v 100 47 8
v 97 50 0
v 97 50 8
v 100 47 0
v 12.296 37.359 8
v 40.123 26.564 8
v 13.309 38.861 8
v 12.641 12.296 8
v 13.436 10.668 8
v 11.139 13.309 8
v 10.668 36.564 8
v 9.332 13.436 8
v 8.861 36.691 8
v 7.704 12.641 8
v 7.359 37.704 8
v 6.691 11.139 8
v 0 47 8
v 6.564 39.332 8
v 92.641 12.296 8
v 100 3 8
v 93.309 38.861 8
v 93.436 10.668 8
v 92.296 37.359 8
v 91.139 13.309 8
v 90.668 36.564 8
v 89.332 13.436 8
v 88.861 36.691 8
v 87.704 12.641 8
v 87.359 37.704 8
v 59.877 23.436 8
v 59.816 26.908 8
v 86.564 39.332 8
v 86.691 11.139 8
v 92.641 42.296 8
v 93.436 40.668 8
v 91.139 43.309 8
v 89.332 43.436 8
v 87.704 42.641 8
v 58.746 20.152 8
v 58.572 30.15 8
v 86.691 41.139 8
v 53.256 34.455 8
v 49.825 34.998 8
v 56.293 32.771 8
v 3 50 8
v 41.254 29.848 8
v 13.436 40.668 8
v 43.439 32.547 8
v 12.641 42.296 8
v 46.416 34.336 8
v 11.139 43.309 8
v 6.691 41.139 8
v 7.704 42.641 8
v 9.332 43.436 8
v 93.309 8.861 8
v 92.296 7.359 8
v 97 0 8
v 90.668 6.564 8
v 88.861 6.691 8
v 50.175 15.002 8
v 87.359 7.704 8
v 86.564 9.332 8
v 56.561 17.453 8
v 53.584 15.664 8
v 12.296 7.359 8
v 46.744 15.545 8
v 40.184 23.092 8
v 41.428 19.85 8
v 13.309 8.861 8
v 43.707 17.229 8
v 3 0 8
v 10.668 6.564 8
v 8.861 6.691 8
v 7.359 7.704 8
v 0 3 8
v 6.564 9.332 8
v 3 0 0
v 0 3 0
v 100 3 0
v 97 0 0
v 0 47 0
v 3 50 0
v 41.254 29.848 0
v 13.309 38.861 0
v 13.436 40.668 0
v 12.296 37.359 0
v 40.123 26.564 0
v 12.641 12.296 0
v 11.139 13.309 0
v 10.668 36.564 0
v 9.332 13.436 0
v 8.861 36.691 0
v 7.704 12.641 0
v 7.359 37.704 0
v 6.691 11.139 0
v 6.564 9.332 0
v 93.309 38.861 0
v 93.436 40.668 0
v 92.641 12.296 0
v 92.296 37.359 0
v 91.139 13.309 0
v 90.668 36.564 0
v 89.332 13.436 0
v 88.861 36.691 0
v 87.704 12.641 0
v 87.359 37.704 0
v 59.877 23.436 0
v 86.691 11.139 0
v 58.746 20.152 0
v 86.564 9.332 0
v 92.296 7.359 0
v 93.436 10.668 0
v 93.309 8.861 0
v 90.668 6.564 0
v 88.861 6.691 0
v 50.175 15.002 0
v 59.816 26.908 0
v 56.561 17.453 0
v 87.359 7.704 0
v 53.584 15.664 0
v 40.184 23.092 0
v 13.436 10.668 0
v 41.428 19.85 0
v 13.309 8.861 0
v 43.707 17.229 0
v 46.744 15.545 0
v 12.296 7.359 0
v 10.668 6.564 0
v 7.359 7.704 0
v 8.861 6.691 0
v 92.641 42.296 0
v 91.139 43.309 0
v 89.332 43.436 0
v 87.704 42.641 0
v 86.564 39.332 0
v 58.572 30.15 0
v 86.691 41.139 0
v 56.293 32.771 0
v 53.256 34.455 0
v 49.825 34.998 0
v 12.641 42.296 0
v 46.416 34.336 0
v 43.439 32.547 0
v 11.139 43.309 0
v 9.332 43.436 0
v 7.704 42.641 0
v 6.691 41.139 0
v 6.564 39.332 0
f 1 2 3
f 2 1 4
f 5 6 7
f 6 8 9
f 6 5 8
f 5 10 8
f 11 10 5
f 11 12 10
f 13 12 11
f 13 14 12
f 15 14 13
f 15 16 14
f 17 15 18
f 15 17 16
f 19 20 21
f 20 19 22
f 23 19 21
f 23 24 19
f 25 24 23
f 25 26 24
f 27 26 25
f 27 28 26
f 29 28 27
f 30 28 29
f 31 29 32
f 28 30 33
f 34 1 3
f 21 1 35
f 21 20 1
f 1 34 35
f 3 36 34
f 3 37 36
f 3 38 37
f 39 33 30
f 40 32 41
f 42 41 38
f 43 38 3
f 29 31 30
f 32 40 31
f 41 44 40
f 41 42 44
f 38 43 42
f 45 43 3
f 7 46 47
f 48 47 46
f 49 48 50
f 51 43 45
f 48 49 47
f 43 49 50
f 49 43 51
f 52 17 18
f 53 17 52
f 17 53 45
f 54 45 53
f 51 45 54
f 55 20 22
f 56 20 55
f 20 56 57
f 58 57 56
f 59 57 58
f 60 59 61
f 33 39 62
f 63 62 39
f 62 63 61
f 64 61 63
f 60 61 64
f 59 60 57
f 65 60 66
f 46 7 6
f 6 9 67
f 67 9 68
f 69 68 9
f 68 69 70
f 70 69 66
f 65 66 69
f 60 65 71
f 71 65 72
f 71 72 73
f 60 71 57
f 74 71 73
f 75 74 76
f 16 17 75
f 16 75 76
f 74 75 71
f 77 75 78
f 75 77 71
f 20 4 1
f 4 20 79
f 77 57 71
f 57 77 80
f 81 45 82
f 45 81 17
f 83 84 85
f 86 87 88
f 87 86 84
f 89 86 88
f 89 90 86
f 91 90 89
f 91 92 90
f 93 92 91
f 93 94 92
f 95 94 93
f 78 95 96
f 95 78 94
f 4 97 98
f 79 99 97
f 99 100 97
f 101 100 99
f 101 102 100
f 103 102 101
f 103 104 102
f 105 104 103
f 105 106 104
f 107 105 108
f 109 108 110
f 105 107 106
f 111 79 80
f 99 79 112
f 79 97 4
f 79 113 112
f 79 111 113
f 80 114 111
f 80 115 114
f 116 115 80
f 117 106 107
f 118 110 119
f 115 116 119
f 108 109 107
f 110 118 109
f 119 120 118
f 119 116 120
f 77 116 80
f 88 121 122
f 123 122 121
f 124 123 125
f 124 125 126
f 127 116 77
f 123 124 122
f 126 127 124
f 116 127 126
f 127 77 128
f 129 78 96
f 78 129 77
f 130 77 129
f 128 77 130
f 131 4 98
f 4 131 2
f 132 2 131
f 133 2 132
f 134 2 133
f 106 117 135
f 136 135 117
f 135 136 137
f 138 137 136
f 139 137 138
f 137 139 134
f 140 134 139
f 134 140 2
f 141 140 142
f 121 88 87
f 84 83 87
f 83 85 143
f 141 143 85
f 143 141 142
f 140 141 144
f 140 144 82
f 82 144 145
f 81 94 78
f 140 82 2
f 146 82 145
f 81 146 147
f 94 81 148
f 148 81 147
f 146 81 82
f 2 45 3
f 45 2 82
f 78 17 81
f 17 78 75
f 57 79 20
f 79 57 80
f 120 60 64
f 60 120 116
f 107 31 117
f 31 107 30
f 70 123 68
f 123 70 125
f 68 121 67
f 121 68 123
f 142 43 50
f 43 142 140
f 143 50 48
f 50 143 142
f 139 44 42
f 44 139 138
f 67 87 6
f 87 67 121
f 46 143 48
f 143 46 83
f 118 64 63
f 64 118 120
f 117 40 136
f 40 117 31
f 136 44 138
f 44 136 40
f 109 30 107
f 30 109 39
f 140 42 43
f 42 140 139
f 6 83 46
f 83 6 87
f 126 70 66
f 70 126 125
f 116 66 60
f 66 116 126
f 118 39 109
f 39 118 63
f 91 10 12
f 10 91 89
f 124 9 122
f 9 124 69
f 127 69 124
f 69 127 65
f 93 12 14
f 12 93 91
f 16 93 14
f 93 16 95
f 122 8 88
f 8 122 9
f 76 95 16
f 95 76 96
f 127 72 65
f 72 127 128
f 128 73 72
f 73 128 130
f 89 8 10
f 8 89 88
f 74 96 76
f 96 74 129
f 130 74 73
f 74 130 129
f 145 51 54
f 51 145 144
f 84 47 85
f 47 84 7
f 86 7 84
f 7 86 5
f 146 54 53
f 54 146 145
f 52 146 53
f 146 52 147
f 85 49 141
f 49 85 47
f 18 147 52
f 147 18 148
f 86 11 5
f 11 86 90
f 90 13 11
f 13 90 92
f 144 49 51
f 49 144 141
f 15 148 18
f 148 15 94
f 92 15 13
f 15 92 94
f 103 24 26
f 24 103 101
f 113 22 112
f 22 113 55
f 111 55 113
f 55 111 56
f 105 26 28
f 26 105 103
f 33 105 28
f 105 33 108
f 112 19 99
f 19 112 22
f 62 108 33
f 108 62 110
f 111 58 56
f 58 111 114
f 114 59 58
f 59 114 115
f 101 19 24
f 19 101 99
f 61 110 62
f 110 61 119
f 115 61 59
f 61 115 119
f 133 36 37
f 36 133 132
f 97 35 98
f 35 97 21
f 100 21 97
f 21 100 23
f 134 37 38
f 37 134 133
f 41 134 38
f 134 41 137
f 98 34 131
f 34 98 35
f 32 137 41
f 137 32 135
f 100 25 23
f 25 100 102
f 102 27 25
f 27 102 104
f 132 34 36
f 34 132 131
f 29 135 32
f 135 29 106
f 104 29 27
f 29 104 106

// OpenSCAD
$fn = 32;

// ----------------------------------------------------------------------
// Spacer plate: rect 100 x 50
// ----------------------------------------------------------------------

// --- parameters (mm) ---
bore_r = 10;              // centre bore radius
bolt_r = 3.5;             // bolt hole radius
plate_t = 8;              // plate thickness, Z (extrusion height)
plate_l = 100;            // plate length, X
plate_w = 50;             // plate width, Y
inset = 10;               // corner hole inset
fit_tol = 0.02;           // declared fit tolerance (prompt contract)
free_tol = 0.2;           // declared free tolerance (prompt contract)

profile = [[3, 0], [97, 0], [100, 3], [100, 47], [97, 50], [3, 50], [0, 47], [0, 3]];  // primary outline, 8 points, counter clockwise
void_1 = [[59.816, 26.908], [58.572, 30.15], [56.293, 32.771], [53.256, 34.455], [49.825, 34.998], [46.416, 34.336], [43.439, 32.547], [41.254, 29.848], [40.123, 26.564], [40.184, 23.092], [41.428, 19.85], [43.707, 17.229], [46.744, 15.545], [50.175, 15.002], [53.584, 15.664], [56.561, 17.453], [58.746, 20.152], [59.877, 23.436]];  // centre bore, 18 points
void_2 = [[13.436, 10.668], [12.641, 12.296], [11.139, 13.309], [9.332, 13.436], [7.704, 12.641], [6.691, 11.139], [6.564, 9.332], [7.359, 7.704], [8.861, 6.691], [10.668, 6.564], [12.296, 7.359], [13.309, 8.861]];  // corner hole, 12 points
void_3 = [[13.436, 40.668], [12.641, 42.296], [11.139, 43.309], [9.332, 43.436], [7.704, 42.641], [6.691, 41.139], [6.564, 39.332], [7.359, 37.704], [8.861, 36.691], [10.668, 36.564], [12.296, 37.359], [13.309, 38.861]];  // corner hole, 12 points
void_4 = [[93.436, 10.668], [92.641, 12.296], [91.139, 13.309], [89.332, 13.436], [87.704, 12.641], [86.691, 11.139], [86.564, 9.332], [87.359, 7.704], [88.861, 6.691], [90.668, 6.564], [92.296, 7.359], [93.309, 8.861]];  // corner hole, 12 points
void_5 = [[93.436, 40.668], [92.641, 42.296], [91.139, 43.309], [89.332, 43.436], [87.704, 42.641], [86.691, 41.139], [86.564, 39.332], [87.359, 37.704], [88.861, 36.691], [90.668, 36.564], [92.296, 37.359], [93.309, 38.861]];  // corner hole, 12 points

// --- the one profile operation ---
difference() {
  linear_extrude(height = plate_t) polygon(points = profile);
  translate([0, 0, -1])
    linear_extrude(height = plate_t + 2) polygon(points = void_1);
  translate([0, 0, -1])
    linear_extrude(height = plate_t + 2) polygon(points = void_2);
  translate([0, 0, -1])
    linear_extrude(height = plate_t + 2) polygon(points = void_3);
  translate([0, 0, -1])
    linear_extrude(height = plate_t + 2) polygon(points = void_4);
  translate([0, 0, -1])
    linear_extrude(height = plate_t + 2) polygon(points = void_5);
}
